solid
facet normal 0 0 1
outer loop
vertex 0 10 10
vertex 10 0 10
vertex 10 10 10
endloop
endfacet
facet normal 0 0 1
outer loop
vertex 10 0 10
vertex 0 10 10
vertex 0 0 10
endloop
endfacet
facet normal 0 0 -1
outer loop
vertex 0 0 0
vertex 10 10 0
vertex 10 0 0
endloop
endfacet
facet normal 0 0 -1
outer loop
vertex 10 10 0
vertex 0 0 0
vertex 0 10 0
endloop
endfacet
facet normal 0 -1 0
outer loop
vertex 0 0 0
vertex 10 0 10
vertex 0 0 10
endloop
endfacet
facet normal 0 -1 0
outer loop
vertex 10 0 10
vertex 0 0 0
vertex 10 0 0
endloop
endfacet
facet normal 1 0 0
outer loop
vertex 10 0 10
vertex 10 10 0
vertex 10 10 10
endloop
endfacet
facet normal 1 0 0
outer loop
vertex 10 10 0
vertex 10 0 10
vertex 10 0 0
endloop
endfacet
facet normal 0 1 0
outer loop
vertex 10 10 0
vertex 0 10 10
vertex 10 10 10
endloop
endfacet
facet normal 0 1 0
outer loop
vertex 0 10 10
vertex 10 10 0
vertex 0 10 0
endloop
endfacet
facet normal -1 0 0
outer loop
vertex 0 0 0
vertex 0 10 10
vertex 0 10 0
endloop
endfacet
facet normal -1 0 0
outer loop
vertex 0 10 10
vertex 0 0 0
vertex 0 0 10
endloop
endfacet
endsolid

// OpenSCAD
// `%` is the background modifier: drawn in the preview, and NOT part of the
// render. OpenSCAD leaves it out of the STL, so contributing no geometry matches
// the exported solid exactly; what is genuinely missing here is the preview
// ghost, and that is what the refusal names.
//
// 🔴 THIS HEADER SAID `scad.ts` "refuses it by name and drops it too" UNTIL
// 2026-08-11, AND THE SECOND HALF IS NOW WRONG IN A WAY THAT MATTERS. The BODY
// is no longer dropped: since `d749b176c2` it is kept and evaluated into a
// throwaway sink, because a `!` written inside a `%` subtree still governs the
// whole model in OpenSCAD and a discarded body could never be searched for one.
// The refusal by name remains. ⚠ *Half a sentence going stale is the harder
// half to notice* — the first clause still reads true and carries the second.
//
// ⚠ ONE MODIFIER ON ONE STATEMENT AGAIN: this case scored `SAME` throughout the
// `%` defects fixed in `d749b176c2`. Its combinations are
// `edge_modifier_root_{in,on}_background` and `edge_modifier_background_operand`.
%sphere(r = 20, $fn = 16);
cube([10, 10, 10]);
